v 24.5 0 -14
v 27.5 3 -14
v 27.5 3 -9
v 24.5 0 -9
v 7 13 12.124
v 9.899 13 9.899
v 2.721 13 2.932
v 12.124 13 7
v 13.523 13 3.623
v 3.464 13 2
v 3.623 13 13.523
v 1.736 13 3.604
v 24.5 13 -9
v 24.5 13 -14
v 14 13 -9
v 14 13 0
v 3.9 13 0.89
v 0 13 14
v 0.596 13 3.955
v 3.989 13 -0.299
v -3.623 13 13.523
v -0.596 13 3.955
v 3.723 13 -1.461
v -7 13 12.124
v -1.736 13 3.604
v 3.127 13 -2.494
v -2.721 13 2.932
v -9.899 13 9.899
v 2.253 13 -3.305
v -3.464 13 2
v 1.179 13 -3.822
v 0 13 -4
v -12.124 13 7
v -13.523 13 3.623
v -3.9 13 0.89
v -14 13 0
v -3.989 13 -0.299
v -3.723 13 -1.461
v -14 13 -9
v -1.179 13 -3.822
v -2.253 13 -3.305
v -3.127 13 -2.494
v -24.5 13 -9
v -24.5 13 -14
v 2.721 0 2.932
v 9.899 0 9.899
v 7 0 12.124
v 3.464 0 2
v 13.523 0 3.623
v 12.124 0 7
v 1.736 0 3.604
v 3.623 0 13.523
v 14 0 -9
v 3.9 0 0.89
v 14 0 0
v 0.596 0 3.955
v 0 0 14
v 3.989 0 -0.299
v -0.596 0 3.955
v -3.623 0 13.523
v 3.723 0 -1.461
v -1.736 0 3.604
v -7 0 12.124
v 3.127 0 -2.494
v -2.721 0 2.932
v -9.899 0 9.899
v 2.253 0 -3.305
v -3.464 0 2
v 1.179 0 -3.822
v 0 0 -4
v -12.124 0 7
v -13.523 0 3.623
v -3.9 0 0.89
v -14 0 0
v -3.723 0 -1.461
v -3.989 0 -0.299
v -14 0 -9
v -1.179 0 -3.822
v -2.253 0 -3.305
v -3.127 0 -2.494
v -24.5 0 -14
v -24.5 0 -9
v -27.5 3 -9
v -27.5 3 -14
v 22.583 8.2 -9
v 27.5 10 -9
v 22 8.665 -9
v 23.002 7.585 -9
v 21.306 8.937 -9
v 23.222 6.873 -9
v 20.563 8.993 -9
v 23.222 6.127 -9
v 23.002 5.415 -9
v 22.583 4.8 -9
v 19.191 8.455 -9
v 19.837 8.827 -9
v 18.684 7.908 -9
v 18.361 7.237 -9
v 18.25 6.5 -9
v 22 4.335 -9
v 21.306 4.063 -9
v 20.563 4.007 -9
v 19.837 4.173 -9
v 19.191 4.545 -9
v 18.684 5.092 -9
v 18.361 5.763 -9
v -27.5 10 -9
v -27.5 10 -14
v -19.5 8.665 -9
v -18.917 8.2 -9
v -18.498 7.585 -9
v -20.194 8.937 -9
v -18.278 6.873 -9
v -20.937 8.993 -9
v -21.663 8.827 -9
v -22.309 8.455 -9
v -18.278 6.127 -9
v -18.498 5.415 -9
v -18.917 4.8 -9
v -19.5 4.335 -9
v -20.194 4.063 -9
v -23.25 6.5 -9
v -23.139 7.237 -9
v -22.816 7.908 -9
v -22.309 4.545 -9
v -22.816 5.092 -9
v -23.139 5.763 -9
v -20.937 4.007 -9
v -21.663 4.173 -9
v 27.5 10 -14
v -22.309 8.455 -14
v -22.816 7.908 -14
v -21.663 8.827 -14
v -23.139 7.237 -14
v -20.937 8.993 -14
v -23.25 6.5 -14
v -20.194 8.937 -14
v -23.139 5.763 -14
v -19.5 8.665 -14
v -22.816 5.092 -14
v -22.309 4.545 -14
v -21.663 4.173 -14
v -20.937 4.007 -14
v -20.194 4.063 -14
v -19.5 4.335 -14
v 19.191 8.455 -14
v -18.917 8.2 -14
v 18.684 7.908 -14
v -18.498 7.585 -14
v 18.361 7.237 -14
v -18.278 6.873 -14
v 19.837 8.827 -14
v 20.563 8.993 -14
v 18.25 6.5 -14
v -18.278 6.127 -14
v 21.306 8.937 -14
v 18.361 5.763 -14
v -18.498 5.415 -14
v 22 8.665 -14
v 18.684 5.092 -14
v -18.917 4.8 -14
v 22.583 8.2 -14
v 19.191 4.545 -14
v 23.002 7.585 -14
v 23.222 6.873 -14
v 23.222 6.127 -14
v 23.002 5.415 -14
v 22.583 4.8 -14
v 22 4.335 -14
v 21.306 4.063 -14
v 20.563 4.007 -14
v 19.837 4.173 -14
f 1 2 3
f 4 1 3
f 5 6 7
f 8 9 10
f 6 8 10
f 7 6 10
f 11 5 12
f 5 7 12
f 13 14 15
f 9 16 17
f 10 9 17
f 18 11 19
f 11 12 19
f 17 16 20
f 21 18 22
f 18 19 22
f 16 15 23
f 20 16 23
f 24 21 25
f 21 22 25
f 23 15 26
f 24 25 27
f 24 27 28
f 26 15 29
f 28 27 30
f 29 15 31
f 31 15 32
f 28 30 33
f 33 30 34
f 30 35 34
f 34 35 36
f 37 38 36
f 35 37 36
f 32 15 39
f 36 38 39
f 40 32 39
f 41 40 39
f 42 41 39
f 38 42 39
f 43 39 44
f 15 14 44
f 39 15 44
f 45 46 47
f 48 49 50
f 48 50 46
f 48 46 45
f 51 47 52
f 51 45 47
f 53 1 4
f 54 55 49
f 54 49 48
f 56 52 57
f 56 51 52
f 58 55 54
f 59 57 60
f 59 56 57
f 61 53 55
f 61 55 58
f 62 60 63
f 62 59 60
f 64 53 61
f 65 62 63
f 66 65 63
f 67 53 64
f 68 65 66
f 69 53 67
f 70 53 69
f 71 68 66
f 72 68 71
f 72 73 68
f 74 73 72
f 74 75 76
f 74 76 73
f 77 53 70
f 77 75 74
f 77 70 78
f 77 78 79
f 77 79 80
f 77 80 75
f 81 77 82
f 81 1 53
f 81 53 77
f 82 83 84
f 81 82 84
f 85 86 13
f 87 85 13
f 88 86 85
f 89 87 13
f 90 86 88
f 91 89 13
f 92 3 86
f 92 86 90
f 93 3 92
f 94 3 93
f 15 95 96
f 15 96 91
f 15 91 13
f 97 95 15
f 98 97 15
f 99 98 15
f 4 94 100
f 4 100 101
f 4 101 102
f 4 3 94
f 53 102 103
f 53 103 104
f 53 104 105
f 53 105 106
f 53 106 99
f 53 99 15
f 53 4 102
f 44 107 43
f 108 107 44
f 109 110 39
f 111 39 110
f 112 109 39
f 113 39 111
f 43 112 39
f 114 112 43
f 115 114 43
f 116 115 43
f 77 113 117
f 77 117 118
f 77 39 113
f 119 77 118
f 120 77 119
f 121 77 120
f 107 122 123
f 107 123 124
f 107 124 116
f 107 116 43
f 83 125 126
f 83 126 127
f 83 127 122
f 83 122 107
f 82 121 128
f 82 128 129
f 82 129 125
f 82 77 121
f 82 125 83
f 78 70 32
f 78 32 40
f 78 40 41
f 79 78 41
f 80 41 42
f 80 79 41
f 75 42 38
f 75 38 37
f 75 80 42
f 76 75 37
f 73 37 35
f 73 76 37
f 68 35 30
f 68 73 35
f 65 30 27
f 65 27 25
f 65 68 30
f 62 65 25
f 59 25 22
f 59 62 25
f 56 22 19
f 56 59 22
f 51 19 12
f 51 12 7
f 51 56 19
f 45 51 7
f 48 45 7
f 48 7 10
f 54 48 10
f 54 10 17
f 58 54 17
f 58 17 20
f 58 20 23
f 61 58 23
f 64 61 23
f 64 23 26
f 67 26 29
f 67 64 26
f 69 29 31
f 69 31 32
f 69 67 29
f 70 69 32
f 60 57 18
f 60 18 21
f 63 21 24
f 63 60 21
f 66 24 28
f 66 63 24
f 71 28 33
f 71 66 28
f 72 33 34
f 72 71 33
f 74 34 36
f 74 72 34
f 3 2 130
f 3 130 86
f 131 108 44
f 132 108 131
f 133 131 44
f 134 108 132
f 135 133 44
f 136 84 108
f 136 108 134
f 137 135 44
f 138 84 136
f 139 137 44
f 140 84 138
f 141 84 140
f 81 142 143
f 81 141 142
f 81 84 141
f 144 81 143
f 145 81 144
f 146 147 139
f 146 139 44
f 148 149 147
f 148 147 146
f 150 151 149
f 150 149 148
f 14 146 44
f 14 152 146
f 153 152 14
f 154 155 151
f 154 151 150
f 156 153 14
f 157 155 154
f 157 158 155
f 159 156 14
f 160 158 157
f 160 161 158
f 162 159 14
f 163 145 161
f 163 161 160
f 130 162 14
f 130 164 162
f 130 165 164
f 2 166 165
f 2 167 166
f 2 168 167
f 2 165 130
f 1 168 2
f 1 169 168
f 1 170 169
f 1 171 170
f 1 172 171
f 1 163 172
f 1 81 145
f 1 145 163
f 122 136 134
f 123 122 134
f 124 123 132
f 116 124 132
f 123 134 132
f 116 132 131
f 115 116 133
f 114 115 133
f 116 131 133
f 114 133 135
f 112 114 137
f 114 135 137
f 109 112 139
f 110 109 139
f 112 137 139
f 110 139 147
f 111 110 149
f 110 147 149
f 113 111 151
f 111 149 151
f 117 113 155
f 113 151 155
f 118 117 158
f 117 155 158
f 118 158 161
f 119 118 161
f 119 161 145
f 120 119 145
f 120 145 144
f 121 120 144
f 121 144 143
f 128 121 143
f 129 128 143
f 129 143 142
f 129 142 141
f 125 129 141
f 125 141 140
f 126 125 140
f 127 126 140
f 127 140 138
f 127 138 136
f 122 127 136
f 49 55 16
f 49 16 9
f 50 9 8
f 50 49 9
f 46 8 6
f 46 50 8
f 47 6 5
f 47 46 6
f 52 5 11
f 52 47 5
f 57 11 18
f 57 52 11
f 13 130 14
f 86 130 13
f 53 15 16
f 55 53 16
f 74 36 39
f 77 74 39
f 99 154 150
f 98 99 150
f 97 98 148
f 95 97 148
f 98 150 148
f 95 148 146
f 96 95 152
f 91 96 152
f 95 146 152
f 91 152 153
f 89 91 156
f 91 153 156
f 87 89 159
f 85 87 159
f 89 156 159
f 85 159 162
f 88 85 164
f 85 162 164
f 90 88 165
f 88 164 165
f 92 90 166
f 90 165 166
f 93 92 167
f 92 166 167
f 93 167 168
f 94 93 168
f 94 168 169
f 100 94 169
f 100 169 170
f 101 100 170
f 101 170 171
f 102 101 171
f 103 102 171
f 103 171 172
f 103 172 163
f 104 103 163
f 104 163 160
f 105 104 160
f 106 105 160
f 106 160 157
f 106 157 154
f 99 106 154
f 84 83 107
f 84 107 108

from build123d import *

# Parameters (mm, degrees)
SKETCH_1_R          = 4
EXTRUDE_1_DEPTH     = 13
CUT_EXTRUDE_1_REACH = 43.343
SKETCH_2_R          = 2.5
CHAMFER_1_SIZE      = 3


with BuildPart() as part:
    # 草图1 → 凸台-拉伸1 (new body)
    with BuildSketch(Plane(origin=(0, 0, 0), x_dir=(1, 0, 0), z_dir=(0, 1, 0))):
        with BuildLine():
            Line((-14, 0), (-14, 9))
            Line((-14, 9), (-27.5, 9))
            Line((-27.5, 9), (-27.5, 14))
            Line((-27.5, 14), (-14, 14))
            Line((-14, 14), (14, 14))
            Line((14, 14), (27.5, 14))
            Line((27.5, 14), (27.5, 9))
            Line((27.5, 9), (14, 9))
            Line((14, 9), (14, 0))
            ThreePointArc((14, 0), (9.899494937, -9.899494937), (0, -14))
            ThreePointArc((0, -14), (-9.899494937, -9.899494937), (-14, 0))
        make_face()
        with Locations(Location((0, 0, 0), (0, 0, 90))):
            Circle(SKETCH_1_R, mode=Mode.SUBTRACT)
    extrude(amount=EXTRUDE_1_DEPTH)

    # 草图2 → 切除-拉伸1 (cut, up to next)
    with BuildSketch(Plane(origin=(0, 0, -14), x_dir=(-1, 0, 0), z_dir=(0, 0, -1)), mode=Mode.PRIVATE) as cut_extrude_1_sk1:
        with Locations((-20.75, 6.5)):
            Circle(SKETCH_2_R)
    cut_extrude_1_tool1 = extrude(cut_extrude_1_sk1.sketch, amount=-CUT_EXTRUDE_1_REACH, mode=Mode.PRIVATE) & part.part
    # 草图2 → 切除-拉伸1 (cut, up to next)
    with BuildSketch(Plane(origin=(0, 0, -14), x_dir=(-1, 0, 0), z_dir=(0, 0, -1)), mode=Mode.PRIVATE) as cut_extrude_1_sk2:
        with Locations((20.75, 6.5)):
            Circle(SKETCH_2_R)
    cut_extrude_1_tool2 = extrude(cut_extrude_1_sk2.sketch, amount=-CUT_EXTRUDE_1_REACH, mode=Mode.PRIVATE) & part.part
    add(cut_extrude_1_tool1.solids().sort_by_distance((20.75, 6.5, -14))[0], mode=Mode.SUBTRACT)
    add(cut_extrude_1_tool2.solids().sort_by_distance((-20.75, 6.5, -14))[0], mode=Mode.SUBTRACT)

    # 倒角1
    chamfer_1_edges = [part.edges().sort_by_distance(p)[0] for p in [
        (-27.5, 0, -11.5),
        (27.5, 0, -11.5),
        (27.5, 13, -11.5),
        (-27.5, 13, -11.5),
    ]]
    chamfer(chamfer_1_edges, length=CHAMFER_1_SIZE)


solid = part.part
